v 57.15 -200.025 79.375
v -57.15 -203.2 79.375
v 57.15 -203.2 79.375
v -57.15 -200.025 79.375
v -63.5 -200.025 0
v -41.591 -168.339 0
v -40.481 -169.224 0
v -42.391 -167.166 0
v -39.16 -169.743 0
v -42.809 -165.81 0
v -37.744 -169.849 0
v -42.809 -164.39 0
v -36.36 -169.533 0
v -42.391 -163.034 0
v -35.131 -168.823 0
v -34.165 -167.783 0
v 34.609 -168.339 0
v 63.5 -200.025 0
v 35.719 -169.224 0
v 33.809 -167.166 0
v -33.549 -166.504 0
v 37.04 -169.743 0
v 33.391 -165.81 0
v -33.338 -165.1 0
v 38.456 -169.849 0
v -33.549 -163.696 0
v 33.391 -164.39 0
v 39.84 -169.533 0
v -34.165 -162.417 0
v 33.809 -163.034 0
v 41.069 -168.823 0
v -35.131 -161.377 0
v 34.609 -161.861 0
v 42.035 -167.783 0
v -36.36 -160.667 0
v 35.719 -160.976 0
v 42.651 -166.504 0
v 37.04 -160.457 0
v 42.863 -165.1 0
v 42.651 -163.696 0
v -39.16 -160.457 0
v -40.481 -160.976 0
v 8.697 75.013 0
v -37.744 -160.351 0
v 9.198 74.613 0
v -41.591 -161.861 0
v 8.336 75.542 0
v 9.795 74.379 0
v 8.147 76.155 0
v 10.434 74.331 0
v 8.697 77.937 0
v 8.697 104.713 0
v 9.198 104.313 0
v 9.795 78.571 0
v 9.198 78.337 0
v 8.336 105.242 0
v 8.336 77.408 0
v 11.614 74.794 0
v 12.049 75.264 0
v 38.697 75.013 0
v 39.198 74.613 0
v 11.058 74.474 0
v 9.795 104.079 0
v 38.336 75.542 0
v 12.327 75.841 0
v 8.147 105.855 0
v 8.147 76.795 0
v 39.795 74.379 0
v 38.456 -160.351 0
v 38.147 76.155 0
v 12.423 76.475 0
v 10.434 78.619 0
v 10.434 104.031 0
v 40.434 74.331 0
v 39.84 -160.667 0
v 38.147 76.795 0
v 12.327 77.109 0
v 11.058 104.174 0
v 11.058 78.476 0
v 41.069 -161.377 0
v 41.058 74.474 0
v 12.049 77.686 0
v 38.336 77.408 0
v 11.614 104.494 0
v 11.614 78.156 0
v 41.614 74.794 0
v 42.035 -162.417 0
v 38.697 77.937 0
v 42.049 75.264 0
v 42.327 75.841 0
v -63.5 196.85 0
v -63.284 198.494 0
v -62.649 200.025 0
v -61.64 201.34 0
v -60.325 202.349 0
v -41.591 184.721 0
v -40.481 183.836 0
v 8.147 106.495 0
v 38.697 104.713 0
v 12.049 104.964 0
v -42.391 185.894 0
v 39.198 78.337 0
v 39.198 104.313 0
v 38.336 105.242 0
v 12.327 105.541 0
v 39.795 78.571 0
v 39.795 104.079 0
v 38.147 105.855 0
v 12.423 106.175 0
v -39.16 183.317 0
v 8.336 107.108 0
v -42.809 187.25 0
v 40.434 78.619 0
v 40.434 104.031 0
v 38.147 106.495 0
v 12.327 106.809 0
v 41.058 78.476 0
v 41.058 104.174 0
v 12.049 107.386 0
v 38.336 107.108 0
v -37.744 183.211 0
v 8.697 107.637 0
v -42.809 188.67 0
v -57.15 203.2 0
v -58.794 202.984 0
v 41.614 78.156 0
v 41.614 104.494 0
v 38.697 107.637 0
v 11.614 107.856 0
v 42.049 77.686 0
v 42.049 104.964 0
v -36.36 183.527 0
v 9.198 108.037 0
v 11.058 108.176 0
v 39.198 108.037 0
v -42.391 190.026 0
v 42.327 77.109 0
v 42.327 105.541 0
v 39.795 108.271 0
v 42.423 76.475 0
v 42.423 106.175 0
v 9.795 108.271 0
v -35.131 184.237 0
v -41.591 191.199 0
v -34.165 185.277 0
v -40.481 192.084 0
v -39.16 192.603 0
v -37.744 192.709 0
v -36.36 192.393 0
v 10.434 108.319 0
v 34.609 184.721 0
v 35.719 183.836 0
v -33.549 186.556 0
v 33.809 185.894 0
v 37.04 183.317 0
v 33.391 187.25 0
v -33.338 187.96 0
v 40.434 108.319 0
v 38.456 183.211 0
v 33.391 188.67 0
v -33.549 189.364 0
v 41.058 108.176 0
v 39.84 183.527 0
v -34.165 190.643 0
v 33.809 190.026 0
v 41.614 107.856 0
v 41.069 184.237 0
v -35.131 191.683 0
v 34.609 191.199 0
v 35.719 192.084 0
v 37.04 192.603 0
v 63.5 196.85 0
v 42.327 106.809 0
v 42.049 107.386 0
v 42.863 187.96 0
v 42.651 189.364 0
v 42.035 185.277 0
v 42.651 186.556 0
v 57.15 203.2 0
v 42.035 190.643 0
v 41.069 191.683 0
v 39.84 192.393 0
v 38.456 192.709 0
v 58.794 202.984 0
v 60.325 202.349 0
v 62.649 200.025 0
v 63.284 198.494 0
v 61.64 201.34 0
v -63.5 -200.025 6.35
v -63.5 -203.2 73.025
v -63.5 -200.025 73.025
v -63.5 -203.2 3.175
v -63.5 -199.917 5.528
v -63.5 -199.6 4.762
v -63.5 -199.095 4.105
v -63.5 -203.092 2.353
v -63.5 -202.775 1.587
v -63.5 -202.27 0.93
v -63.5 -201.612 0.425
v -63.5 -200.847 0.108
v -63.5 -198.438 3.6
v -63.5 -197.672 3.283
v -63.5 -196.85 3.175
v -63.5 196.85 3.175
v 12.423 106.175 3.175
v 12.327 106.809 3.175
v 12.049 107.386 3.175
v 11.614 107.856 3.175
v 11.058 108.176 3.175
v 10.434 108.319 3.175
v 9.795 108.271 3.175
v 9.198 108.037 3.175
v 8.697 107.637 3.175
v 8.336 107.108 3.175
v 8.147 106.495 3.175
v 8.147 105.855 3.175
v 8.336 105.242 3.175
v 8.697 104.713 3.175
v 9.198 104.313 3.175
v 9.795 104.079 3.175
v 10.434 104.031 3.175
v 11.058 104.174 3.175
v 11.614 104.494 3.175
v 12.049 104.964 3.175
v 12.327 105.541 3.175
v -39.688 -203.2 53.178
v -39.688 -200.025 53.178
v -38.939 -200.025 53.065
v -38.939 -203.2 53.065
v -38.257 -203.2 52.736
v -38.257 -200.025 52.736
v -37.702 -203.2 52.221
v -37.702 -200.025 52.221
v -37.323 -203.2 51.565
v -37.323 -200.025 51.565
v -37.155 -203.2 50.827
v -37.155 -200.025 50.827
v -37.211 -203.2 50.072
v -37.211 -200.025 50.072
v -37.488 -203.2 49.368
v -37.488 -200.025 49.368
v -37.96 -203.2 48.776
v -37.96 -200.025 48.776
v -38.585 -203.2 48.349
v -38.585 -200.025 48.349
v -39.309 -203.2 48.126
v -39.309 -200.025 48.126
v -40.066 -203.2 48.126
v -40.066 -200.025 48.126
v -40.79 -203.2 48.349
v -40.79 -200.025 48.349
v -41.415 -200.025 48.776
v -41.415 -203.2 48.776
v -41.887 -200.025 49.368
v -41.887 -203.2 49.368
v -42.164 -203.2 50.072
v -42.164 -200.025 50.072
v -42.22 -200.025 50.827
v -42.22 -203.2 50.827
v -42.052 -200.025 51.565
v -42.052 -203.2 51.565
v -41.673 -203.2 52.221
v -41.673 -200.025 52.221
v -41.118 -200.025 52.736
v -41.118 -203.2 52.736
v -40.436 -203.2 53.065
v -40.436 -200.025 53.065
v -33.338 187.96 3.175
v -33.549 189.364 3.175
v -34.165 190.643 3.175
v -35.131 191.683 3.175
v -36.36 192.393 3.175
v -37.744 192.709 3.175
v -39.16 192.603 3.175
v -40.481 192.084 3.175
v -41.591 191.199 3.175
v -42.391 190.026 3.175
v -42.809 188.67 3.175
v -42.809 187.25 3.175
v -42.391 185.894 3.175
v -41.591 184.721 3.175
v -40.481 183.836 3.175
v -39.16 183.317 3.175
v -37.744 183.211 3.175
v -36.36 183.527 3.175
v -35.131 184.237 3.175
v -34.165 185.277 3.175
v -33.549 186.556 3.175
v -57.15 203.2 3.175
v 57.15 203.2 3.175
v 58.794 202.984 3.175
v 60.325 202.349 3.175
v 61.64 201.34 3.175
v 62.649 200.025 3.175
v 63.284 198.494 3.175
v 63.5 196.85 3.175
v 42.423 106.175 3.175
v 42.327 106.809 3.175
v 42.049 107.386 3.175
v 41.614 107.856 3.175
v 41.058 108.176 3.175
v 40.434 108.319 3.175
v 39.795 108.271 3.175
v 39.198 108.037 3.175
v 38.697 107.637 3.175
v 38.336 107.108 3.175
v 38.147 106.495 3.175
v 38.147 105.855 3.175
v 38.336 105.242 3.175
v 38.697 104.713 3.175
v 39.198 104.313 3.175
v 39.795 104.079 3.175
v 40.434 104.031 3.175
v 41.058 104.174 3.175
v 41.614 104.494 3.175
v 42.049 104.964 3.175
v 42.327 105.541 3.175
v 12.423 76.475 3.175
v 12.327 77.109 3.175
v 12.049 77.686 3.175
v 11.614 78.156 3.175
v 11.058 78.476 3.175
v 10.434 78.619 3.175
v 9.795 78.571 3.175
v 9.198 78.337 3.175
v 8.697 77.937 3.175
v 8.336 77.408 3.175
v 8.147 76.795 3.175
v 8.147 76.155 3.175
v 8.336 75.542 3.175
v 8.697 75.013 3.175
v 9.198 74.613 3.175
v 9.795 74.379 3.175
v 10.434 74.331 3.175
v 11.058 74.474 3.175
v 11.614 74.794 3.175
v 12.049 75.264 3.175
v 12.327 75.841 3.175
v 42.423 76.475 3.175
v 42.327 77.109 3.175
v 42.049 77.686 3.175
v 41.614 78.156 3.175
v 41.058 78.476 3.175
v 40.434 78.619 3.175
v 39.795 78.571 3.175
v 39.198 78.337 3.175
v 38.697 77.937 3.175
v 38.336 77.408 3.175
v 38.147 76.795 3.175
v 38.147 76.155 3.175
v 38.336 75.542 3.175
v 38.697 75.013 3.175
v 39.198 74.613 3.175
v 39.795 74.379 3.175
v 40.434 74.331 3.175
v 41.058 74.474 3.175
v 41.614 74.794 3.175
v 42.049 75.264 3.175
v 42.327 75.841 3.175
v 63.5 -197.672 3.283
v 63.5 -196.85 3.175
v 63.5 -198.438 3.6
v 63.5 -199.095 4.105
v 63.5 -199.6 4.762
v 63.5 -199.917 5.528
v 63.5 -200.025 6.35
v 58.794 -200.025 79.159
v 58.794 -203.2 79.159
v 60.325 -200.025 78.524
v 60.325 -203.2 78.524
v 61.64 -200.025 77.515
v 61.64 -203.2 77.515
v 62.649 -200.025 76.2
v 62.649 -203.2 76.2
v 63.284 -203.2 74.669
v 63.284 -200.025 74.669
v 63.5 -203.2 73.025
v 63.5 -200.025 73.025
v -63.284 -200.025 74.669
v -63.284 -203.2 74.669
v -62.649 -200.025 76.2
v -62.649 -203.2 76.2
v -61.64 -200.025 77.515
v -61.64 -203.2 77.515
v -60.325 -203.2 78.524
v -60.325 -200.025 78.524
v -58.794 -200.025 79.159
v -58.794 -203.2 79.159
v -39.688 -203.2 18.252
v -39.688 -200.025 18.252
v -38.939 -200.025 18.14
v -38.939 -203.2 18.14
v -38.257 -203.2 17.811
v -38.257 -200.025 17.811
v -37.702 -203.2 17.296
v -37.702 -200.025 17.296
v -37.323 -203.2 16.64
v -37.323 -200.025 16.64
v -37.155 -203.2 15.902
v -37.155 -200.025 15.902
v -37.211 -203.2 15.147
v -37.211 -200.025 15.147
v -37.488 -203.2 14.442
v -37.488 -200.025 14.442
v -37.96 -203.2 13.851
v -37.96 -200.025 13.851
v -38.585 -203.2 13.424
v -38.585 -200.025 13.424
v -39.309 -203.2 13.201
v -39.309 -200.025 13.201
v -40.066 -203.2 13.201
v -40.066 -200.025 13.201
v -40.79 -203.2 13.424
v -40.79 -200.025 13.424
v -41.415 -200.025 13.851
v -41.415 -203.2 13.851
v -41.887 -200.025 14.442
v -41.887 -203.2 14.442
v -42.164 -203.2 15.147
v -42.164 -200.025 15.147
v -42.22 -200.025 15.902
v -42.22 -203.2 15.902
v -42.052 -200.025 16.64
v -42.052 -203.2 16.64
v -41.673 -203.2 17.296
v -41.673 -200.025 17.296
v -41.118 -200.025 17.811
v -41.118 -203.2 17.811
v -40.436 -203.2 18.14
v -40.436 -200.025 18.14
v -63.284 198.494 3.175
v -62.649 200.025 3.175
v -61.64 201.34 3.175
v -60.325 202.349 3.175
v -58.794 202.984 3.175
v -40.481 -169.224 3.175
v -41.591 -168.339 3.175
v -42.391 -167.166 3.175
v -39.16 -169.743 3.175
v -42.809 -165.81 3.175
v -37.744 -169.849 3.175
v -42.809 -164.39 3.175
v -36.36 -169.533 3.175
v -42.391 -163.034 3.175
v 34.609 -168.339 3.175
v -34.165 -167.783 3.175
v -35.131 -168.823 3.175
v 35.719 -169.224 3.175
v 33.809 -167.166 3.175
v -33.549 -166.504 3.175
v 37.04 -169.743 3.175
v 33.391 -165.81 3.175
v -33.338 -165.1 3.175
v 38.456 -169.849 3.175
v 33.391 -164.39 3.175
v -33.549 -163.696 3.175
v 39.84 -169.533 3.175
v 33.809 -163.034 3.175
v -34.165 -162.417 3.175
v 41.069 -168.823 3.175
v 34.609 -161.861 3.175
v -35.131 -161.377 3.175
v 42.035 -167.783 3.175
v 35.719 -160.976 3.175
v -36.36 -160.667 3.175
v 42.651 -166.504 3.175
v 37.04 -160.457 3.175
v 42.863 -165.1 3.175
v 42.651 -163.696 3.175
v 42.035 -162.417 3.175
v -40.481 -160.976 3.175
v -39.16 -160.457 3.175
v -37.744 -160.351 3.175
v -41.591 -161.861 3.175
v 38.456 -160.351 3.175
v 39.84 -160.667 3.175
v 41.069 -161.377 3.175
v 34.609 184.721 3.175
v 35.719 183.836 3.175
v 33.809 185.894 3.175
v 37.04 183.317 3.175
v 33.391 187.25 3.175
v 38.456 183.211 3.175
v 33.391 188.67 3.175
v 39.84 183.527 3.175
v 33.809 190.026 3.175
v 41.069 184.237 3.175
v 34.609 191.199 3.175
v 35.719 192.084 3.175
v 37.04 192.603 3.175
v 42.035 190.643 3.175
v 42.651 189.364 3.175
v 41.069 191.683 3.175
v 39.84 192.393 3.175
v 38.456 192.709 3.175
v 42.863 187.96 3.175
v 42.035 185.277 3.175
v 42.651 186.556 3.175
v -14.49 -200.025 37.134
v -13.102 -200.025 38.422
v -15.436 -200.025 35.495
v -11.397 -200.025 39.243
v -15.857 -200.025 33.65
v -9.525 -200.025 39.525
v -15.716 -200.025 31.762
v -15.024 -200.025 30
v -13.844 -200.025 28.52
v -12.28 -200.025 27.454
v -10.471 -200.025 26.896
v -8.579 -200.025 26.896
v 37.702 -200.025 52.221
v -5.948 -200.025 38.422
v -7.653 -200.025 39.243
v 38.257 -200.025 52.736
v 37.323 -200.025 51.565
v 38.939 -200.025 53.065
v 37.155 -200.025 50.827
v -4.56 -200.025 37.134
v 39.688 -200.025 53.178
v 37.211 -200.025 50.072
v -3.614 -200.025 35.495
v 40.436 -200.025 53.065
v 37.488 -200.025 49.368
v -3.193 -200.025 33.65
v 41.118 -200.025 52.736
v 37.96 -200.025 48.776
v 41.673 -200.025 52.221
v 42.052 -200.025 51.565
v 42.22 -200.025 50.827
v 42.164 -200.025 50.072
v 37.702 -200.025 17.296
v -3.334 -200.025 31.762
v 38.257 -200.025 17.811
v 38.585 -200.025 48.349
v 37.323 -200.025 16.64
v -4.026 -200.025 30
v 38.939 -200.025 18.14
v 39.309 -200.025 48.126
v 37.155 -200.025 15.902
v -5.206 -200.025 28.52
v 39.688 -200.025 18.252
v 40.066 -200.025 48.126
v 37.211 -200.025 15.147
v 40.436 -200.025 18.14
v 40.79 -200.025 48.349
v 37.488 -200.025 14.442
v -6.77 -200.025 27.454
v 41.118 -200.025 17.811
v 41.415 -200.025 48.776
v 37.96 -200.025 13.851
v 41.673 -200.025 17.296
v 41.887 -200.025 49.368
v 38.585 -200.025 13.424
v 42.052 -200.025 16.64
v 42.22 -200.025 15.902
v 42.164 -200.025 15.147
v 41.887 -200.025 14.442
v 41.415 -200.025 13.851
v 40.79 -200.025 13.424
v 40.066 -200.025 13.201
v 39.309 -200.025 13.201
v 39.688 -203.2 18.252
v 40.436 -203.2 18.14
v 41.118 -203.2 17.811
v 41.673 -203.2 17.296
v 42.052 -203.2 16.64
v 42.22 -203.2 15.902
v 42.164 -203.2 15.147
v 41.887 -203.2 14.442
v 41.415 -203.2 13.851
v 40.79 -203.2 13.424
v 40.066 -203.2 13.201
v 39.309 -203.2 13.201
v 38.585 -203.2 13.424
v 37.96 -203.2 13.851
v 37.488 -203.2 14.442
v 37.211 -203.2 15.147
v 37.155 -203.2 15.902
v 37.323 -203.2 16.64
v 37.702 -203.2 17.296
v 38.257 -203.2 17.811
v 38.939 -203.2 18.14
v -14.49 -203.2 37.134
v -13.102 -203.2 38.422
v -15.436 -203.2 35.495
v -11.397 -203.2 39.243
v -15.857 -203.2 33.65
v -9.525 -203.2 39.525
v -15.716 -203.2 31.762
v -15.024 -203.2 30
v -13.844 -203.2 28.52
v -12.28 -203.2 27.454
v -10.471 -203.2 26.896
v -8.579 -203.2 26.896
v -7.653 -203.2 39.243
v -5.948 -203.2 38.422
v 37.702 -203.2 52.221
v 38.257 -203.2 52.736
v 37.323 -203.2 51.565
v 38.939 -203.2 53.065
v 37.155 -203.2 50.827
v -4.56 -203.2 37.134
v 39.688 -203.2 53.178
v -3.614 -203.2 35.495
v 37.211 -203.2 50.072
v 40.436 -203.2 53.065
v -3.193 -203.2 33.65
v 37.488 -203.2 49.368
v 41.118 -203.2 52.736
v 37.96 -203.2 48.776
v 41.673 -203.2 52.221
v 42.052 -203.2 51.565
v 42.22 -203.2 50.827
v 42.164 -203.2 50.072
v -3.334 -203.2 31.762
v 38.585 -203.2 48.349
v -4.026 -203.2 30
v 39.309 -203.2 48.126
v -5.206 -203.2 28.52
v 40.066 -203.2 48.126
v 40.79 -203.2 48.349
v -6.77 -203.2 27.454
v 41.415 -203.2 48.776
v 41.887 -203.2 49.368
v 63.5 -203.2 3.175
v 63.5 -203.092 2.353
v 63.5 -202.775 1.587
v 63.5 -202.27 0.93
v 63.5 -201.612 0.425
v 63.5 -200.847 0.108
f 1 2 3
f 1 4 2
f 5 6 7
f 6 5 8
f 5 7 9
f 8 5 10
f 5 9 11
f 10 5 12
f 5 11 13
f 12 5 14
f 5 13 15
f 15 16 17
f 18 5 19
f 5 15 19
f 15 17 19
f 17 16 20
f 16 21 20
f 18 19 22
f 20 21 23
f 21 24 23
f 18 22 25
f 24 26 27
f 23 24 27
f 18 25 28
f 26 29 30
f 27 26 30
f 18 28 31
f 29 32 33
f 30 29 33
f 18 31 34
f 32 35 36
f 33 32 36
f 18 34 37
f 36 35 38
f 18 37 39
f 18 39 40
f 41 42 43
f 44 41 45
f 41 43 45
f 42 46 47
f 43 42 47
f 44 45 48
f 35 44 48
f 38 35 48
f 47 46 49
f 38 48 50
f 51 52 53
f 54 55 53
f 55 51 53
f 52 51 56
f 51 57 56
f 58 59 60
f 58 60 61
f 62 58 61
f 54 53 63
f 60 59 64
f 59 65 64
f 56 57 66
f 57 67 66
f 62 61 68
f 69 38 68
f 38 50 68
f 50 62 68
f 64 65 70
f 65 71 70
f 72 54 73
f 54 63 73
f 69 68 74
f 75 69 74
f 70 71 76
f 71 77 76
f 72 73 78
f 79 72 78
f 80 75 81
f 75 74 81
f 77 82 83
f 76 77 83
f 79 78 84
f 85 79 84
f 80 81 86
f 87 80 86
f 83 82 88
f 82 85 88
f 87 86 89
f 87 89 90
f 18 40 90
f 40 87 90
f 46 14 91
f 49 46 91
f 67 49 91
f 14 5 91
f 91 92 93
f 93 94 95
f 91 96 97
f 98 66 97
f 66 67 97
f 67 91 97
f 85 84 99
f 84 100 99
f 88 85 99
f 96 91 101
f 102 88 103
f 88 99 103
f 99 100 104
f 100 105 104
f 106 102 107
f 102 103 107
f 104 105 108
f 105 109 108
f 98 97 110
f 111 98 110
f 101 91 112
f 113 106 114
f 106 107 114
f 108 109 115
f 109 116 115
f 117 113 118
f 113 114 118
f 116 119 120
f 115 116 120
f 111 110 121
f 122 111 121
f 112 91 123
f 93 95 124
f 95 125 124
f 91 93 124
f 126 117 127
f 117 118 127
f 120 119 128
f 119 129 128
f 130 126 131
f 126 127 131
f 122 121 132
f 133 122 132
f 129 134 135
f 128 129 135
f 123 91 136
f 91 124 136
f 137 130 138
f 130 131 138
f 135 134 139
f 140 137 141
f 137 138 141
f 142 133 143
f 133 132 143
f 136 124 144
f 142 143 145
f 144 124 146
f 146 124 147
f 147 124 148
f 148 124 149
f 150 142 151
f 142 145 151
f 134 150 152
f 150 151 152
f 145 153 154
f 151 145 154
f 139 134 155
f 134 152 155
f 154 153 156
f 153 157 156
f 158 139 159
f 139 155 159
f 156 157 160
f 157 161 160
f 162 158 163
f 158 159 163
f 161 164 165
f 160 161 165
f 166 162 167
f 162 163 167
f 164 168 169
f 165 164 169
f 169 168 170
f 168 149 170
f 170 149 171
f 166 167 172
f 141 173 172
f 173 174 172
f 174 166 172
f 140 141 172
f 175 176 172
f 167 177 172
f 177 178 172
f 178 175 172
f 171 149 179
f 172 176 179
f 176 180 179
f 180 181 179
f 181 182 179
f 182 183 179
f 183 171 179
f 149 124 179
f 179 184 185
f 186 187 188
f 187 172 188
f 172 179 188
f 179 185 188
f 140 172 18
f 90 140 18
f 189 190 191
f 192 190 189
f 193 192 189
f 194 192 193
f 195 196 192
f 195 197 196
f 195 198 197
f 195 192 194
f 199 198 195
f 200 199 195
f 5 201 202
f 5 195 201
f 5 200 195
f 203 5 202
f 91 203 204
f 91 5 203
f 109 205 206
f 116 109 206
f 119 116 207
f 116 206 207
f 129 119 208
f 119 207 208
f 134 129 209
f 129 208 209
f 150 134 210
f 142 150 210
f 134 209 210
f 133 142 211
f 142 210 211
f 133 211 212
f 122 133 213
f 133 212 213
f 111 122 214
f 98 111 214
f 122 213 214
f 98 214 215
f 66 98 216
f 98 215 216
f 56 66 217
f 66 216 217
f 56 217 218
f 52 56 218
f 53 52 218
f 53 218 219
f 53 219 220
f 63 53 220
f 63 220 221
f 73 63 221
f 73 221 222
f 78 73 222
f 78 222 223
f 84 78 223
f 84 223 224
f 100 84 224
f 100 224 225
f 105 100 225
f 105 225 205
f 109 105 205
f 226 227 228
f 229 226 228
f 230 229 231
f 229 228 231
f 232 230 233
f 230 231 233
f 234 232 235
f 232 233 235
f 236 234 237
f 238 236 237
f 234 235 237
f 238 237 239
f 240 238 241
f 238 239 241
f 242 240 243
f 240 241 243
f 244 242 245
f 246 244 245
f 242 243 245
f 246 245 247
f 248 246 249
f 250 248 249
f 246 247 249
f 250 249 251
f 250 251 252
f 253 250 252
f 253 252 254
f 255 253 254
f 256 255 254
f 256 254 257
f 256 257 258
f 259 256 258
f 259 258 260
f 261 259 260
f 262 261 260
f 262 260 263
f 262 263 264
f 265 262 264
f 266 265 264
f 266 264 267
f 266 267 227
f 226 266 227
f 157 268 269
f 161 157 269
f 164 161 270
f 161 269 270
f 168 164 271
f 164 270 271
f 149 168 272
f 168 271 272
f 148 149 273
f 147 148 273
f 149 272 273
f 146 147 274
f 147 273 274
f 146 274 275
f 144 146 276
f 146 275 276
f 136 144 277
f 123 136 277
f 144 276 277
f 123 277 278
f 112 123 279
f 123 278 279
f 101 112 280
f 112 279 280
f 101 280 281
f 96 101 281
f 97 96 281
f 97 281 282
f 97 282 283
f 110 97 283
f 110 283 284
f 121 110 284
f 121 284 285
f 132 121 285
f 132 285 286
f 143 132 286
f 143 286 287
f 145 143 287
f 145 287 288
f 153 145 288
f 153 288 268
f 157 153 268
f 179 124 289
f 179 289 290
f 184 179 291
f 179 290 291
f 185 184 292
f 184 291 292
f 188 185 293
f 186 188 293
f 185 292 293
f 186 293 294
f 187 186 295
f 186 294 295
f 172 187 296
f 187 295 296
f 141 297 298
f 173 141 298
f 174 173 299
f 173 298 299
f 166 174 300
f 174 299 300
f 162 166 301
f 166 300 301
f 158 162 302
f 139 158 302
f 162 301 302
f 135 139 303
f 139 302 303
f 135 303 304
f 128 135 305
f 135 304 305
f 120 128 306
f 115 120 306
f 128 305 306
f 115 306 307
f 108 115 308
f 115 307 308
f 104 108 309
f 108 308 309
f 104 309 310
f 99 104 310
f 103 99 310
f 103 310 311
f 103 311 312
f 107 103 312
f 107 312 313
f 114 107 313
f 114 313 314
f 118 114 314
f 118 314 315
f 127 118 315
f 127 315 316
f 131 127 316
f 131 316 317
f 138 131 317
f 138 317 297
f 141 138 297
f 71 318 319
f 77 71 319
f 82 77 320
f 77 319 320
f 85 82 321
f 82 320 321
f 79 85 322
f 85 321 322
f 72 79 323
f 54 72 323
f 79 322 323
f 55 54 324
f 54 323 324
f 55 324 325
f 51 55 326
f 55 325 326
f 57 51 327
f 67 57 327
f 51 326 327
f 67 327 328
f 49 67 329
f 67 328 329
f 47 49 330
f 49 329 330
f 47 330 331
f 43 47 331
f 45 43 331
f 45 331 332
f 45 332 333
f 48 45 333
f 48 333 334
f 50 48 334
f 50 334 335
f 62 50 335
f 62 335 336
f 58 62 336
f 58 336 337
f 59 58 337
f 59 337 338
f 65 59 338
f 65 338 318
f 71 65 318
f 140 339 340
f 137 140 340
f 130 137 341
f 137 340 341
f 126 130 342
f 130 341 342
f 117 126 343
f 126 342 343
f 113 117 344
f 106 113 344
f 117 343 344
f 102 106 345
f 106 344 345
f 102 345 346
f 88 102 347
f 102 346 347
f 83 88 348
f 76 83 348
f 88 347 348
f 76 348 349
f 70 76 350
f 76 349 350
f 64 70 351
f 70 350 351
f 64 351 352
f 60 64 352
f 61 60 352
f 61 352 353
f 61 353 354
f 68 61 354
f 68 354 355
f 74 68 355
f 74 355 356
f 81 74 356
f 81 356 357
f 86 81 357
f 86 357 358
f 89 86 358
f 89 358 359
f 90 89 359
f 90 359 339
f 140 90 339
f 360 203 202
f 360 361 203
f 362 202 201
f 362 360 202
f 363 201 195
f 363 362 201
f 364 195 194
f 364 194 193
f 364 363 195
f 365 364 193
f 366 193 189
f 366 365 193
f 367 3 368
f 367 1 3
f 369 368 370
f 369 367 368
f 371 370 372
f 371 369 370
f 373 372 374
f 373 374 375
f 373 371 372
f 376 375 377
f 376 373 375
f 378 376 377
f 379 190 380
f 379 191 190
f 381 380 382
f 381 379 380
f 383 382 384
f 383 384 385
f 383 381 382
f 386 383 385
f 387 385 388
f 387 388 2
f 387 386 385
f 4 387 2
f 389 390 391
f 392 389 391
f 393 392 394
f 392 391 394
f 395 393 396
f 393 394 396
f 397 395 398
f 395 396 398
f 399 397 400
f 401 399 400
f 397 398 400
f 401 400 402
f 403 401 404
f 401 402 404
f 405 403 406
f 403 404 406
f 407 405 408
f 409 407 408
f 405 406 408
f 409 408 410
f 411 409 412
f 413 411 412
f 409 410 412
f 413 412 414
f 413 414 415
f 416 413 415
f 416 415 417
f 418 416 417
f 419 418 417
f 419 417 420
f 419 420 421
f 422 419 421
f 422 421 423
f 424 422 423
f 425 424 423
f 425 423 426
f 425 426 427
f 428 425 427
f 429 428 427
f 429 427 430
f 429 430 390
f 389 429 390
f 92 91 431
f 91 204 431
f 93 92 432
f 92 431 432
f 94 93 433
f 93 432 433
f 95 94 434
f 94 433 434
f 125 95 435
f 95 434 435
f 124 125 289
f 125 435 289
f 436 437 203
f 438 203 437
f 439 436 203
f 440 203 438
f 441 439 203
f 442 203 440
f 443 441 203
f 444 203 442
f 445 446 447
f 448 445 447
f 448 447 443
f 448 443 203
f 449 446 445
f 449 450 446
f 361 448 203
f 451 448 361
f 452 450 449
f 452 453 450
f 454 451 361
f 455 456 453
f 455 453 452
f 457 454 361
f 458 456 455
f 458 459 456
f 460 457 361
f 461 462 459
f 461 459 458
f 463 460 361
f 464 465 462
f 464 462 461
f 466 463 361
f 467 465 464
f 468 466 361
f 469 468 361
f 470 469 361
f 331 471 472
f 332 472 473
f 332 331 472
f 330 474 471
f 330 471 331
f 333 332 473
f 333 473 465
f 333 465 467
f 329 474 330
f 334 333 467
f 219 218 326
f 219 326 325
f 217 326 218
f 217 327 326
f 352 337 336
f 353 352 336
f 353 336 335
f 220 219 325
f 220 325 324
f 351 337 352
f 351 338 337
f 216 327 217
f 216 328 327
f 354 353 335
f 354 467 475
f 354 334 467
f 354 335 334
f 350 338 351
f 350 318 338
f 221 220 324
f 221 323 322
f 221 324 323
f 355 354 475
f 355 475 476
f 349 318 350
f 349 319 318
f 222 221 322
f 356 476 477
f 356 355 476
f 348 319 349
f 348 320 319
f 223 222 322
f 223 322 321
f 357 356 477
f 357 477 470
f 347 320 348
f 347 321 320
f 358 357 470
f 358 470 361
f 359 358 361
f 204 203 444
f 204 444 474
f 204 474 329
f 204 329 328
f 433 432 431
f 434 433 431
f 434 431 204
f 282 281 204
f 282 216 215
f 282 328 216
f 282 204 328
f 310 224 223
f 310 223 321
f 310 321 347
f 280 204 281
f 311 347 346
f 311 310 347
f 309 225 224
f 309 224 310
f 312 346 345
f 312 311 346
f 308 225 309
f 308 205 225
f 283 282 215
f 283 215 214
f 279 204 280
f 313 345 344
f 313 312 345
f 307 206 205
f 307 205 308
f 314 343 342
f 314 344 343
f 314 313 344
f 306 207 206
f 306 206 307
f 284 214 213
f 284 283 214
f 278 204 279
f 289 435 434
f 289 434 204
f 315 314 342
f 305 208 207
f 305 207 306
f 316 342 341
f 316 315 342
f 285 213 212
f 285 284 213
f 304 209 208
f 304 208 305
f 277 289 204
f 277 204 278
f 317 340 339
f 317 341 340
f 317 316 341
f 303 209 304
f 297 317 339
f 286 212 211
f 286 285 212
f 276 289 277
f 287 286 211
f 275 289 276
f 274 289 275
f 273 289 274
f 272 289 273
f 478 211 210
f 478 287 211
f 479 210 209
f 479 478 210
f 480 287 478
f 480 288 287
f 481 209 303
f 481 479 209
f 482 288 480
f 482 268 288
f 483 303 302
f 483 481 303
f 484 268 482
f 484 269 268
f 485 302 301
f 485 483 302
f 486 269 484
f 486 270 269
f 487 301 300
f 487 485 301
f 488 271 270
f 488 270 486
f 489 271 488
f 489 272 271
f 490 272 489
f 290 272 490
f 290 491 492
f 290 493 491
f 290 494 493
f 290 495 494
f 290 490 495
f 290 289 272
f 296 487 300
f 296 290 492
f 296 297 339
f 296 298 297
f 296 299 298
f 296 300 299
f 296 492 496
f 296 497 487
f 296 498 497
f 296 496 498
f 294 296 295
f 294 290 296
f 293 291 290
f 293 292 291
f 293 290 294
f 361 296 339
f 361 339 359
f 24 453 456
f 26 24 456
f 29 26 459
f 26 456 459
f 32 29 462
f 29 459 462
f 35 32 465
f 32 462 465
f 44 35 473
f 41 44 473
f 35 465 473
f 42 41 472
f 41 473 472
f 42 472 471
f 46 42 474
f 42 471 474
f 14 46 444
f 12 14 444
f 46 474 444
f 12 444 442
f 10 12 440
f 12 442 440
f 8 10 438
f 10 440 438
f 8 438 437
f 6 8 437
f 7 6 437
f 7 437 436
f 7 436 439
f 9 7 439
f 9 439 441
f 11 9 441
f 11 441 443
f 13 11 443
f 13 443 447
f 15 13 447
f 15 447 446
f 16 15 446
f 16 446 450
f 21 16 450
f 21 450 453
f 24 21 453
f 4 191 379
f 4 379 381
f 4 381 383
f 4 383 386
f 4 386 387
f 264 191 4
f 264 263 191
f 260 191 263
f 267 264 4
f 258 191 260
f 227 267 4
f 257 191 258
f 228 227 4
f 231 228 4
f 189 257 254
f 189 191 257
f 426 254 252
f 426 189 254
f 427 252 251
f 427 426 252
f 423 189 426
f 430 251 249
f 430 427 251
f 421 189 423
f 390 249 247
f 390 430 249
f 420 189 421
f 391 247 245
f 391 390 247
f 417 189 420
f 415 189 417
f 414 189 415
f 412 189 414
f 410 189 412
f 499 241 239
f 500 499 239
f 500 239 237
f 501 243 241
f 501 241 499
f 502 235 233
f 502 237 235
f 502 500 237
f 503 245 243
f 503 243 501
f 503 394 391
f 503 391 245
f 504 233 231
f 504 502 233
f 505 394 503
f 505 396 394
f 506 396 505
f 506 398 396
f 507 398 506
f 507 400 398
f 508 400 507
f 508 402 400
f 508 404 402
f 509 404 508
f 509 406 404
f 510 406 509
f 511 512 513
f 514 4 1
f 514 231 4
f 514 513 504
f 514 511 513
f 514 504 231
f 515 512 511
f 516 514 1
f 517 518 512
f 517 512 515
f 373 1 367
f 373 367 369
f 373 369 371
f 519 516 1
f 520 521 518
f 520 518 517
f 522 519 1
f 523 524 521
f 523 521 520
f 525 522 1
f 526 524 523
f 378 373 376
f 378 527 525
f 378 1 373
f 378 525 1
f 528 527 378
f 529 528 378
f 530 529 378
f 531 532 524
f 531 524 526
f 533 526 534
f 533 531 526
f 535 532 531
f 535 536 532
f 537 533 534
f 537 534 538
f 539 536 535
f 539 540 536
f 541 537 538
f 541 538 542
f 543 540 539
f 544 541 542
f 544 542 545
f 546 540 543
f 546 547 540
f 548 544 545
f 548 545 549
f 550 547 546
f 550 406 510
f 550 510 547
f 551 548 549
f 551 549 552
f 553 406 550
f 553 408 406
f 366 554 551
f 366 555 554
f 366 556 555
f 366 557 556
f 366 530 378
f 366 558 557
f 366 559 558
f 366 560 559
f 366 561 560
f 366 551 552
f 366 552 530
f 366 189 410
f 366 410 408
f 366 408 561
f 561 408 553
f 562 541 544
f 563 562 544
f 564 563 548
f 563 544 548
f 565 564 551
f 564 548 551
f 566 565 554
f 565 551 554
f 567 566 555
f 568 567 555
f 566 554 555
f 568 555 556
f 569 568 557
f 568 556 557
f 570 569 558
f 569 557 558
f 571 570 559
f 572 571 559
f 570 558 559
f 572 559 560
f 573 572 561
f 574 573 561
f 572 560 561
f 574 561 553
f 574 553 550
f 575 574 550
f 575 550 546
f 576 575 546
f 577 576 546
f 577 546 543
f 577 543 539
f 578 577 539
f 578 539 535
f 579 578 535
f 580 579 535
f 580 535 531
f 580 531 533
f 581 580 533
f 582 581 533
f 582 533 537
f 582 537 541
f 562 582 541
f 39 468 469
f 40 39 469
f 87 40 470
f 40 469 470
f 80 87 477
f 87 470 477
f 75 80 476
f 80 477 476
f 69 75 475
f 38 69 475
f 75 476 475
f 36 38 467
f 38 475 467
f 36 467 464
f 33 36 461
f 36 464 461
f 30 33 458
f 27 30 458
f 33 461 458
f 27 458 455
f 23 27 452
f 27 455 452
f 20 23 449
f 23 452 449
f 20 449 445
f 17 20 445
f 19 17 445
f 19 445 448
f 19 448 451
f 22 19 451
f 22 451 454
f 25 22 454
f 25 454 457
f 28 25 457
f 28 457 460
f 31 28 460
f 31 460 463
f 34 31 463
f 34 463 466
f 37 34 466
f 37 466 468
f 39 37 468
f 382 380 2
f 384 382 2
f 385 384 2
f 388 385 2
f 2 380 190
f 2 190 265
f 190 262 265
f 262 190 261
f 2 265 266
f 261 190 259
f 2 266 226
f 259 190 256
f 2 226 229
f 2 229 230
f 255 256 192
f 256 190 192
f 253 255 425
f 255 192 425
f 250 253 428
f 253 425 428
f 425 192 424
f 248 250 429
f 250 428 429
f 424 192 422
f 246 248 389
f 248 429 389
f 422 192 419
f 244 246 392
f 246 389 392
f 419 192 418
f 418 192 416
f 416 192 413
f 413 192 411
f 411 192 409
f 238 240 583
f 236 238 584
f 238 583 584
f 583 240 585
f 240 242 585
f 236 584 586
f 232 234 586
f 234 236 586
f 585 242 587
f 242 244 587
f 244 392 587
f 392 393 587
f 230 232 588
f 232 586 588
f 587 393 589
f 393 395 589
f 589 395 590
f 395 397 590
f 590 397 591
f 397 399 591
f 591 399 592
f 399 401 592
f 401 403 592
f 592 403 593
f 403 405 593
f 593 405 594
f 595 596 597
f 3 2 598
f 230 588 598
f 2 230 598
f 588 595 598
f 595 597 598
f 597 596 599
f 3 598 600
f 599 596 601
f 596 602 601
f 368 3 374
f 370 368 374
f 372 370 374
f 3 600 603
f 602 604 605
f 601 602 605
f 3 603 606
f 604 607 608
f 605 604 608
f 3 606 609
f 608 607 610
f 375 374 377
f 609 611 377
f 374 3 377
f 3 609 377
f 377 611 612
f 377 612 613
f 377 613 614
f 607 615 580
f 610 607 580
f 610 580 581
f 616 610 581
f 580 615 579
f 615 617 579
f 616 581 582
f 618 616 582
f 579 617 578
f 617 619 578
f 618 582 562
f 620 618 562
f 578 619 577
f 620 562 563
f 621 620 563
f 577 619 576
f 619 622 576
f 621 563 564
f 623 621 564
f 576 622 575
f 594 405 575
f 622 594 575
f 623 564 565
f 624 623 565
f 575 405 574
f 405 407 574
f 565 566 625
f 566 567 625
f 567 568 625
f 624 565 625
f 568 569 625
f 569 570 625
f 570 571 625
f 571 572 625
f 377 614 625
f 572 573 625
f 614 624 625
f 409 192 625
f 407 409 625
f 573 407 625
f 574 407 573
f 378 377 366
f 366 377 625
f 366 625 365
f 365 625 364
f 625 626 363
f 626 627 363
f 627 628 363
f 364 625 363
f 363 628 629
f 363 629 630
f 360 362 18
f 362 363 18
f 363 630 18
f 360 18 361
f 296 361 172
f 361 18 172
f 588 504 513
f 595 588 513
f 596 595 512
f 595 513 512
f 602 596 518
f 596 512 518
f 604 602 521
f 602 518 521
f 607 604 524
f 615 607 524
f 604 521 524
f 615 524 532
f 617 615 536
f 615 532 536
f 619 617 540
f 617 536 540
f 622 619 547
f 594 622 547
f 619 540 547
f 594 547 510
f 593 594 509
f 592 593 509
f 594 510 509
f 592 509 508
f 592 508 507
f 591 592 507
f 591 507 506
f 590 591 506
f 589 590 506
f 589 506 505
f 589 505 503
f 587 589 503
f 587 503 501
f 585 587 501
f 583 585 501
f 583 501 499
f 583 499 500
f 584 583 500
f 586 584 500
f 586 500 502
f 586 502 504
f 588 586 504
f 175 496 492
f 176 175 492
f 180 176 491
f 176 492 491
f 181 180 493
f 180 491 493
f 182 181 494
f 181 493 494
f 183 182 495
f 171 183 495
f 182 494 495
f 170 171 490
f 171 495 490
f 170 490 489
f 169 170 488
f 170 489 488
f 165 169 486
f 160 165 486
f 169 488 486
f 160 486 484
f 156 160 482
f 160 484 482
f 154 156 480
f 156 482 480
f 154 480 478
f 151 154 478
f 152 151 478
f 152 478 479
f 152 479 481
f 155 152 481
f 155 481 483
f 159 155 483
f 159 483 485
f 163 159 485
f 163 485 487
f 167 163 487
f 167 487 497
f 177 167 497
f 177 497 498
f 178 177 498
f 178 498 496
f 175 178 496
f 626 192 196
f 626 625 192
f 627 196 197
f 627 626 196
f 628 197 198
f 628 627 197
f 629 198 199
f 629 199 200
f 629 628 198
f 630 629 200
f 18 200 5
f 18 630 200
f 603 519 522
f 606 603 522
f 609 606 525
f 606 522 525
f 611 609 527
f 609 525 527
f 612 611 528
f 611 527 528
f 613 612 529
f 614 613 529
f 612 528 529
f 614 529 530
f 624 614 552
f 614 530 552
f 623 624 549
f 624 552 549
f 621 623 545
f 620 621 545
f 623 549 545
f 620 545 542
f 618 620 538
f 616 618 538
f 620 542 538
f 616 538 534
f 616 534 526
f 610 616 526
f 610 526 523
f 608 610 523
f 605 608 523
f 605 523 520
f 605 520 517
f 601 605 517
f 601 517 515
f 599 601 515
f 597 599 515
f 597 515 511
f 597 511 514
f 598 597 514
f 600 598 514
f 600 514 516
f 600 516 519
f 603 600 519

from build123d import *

# Parameters (mm, degrees)
SKETCH2_W           = 127
SKETCH2_H           = 406.4
BOSS_EXTRUDE1_DEPTH = 3.175
SKETCH3_W           = 127
SKETCH3_H           = 3.175
BOSS_EXTRUDE2_DEPTH = 76.2
FILLET1_R           = 3.175
FILLET2_R           = 6.35
SKETCH4_R           = 6.35
SKETCH4_R_2         = 2.54
CUT_EXTRUDE1_DEPTH  = 416.840163104
SKETCH5_R           = 2.15
SKETCH5_R_2         = 4.7625
CUT_EXTRUDE2_DEPTH  = 227.117071448


with BuildPart() as part:
    # Sketch2 → Boss-Extrude1 (new body)
    with BuildSketch(Plane.XY):
        Rectangle(SKETCH2_W, SKETCH2_H)
    extrude(amount=BOSS_EXTRUDE1_DEPTH)

    # Sketch3 → Boss-Extrude2 (add)
    with BuildSketch(Plane.XY.offset(3.175)):
        with Locations((0, -201.6125)):
            Rectangle(SKETCH3_W, SKETCH3_H)
    extrude(amount=BOSS_EXTRUDE2_DEPTH)

    # Fillet1
    fillet1_edges = [part.edges().sort_by_distance(p)[0] for p in [
        (0, -200.025, 3.175),
        (0, -203.2, 0),
    ]]
    fillet(fillet1_edges, radius=FILLET1_R)

    # Fillet2
    fillet2_edges = [part.edges().sort_by_distance(p)[0] for p in [
        (-63.5, -201.6125, 79.375),
        (63.5, -201.6125, 79.375),
        (-63.5, 203.2, 1.5875),
        (63.5, 203.2, 1.5875),
    ]]
    fillet(fillet2_edges, radius=FILLET2_R)

    # Sketch4 → Cut-Extrude1 (cut, through all)
    with BuildSketch(Plane(origin=(0, -200.025, 0), x_dir=(1, 0, 0), z_dir=(0, 1, 0))):
        with Locations(Location((-9.525, -33.175, 0), (0, 0, 270))):
            Circle(SKETCH4_R)
        with Locations(Location((-39.6875, -15.7125, 0), (0, 0, 270))):
            Circle(SKETCH4_R_2)
        with Locations(Location((-39.6875, -50.6375, 0), (0, 0, 270))):
            Circle(SKETCH4_R_2)
        with Locations(Location((39.6875, -15.7125, 0), (0, 0, 270))):
            Circle(SKETCH4_R_2)
        with Locations(Location((39.6875, -50.6375, 0), (0, 0, 270))):
            Circle(SKETCH4_R_2)
    extrude(amount=-CUT_EXTRUDE1_DEPTH, mode=Mode.SUBTRACT)

    # Sketch5 → Cut-Extrude2 (cut, through all)
    with BuildSketch(Plane.XY.offset(3.175)):
        with Locations((10.273, 76.475)):
            Circle(SKETCH5_R)
        with Locations((40.273, 76.475)):
            Circle(SKETCH5_R)
        with Locations((40.273, 106.175)):
            Circle(SKETCH5_R)
        with Locations((10.273, 106.175)):
            Circle(SKETCH5_R)
        with Locations((-38.1, 187.96)):
            Circle(SKETCH5_R_2)
        with Locations((38.1, 187.96)):
            Circle(SKETCH5_R_2)
        with Locations((-38.1, -165.1)):
            Circle(SKETCH5_R_2)
        with Locations((38.1, -165.1)):
            Circle(SKETCH5_R_2)
    extrude(amount=-CUT_EXTRUDE2_DEPTH, mode=Mode.SUBTRACT)


solid = part.part
